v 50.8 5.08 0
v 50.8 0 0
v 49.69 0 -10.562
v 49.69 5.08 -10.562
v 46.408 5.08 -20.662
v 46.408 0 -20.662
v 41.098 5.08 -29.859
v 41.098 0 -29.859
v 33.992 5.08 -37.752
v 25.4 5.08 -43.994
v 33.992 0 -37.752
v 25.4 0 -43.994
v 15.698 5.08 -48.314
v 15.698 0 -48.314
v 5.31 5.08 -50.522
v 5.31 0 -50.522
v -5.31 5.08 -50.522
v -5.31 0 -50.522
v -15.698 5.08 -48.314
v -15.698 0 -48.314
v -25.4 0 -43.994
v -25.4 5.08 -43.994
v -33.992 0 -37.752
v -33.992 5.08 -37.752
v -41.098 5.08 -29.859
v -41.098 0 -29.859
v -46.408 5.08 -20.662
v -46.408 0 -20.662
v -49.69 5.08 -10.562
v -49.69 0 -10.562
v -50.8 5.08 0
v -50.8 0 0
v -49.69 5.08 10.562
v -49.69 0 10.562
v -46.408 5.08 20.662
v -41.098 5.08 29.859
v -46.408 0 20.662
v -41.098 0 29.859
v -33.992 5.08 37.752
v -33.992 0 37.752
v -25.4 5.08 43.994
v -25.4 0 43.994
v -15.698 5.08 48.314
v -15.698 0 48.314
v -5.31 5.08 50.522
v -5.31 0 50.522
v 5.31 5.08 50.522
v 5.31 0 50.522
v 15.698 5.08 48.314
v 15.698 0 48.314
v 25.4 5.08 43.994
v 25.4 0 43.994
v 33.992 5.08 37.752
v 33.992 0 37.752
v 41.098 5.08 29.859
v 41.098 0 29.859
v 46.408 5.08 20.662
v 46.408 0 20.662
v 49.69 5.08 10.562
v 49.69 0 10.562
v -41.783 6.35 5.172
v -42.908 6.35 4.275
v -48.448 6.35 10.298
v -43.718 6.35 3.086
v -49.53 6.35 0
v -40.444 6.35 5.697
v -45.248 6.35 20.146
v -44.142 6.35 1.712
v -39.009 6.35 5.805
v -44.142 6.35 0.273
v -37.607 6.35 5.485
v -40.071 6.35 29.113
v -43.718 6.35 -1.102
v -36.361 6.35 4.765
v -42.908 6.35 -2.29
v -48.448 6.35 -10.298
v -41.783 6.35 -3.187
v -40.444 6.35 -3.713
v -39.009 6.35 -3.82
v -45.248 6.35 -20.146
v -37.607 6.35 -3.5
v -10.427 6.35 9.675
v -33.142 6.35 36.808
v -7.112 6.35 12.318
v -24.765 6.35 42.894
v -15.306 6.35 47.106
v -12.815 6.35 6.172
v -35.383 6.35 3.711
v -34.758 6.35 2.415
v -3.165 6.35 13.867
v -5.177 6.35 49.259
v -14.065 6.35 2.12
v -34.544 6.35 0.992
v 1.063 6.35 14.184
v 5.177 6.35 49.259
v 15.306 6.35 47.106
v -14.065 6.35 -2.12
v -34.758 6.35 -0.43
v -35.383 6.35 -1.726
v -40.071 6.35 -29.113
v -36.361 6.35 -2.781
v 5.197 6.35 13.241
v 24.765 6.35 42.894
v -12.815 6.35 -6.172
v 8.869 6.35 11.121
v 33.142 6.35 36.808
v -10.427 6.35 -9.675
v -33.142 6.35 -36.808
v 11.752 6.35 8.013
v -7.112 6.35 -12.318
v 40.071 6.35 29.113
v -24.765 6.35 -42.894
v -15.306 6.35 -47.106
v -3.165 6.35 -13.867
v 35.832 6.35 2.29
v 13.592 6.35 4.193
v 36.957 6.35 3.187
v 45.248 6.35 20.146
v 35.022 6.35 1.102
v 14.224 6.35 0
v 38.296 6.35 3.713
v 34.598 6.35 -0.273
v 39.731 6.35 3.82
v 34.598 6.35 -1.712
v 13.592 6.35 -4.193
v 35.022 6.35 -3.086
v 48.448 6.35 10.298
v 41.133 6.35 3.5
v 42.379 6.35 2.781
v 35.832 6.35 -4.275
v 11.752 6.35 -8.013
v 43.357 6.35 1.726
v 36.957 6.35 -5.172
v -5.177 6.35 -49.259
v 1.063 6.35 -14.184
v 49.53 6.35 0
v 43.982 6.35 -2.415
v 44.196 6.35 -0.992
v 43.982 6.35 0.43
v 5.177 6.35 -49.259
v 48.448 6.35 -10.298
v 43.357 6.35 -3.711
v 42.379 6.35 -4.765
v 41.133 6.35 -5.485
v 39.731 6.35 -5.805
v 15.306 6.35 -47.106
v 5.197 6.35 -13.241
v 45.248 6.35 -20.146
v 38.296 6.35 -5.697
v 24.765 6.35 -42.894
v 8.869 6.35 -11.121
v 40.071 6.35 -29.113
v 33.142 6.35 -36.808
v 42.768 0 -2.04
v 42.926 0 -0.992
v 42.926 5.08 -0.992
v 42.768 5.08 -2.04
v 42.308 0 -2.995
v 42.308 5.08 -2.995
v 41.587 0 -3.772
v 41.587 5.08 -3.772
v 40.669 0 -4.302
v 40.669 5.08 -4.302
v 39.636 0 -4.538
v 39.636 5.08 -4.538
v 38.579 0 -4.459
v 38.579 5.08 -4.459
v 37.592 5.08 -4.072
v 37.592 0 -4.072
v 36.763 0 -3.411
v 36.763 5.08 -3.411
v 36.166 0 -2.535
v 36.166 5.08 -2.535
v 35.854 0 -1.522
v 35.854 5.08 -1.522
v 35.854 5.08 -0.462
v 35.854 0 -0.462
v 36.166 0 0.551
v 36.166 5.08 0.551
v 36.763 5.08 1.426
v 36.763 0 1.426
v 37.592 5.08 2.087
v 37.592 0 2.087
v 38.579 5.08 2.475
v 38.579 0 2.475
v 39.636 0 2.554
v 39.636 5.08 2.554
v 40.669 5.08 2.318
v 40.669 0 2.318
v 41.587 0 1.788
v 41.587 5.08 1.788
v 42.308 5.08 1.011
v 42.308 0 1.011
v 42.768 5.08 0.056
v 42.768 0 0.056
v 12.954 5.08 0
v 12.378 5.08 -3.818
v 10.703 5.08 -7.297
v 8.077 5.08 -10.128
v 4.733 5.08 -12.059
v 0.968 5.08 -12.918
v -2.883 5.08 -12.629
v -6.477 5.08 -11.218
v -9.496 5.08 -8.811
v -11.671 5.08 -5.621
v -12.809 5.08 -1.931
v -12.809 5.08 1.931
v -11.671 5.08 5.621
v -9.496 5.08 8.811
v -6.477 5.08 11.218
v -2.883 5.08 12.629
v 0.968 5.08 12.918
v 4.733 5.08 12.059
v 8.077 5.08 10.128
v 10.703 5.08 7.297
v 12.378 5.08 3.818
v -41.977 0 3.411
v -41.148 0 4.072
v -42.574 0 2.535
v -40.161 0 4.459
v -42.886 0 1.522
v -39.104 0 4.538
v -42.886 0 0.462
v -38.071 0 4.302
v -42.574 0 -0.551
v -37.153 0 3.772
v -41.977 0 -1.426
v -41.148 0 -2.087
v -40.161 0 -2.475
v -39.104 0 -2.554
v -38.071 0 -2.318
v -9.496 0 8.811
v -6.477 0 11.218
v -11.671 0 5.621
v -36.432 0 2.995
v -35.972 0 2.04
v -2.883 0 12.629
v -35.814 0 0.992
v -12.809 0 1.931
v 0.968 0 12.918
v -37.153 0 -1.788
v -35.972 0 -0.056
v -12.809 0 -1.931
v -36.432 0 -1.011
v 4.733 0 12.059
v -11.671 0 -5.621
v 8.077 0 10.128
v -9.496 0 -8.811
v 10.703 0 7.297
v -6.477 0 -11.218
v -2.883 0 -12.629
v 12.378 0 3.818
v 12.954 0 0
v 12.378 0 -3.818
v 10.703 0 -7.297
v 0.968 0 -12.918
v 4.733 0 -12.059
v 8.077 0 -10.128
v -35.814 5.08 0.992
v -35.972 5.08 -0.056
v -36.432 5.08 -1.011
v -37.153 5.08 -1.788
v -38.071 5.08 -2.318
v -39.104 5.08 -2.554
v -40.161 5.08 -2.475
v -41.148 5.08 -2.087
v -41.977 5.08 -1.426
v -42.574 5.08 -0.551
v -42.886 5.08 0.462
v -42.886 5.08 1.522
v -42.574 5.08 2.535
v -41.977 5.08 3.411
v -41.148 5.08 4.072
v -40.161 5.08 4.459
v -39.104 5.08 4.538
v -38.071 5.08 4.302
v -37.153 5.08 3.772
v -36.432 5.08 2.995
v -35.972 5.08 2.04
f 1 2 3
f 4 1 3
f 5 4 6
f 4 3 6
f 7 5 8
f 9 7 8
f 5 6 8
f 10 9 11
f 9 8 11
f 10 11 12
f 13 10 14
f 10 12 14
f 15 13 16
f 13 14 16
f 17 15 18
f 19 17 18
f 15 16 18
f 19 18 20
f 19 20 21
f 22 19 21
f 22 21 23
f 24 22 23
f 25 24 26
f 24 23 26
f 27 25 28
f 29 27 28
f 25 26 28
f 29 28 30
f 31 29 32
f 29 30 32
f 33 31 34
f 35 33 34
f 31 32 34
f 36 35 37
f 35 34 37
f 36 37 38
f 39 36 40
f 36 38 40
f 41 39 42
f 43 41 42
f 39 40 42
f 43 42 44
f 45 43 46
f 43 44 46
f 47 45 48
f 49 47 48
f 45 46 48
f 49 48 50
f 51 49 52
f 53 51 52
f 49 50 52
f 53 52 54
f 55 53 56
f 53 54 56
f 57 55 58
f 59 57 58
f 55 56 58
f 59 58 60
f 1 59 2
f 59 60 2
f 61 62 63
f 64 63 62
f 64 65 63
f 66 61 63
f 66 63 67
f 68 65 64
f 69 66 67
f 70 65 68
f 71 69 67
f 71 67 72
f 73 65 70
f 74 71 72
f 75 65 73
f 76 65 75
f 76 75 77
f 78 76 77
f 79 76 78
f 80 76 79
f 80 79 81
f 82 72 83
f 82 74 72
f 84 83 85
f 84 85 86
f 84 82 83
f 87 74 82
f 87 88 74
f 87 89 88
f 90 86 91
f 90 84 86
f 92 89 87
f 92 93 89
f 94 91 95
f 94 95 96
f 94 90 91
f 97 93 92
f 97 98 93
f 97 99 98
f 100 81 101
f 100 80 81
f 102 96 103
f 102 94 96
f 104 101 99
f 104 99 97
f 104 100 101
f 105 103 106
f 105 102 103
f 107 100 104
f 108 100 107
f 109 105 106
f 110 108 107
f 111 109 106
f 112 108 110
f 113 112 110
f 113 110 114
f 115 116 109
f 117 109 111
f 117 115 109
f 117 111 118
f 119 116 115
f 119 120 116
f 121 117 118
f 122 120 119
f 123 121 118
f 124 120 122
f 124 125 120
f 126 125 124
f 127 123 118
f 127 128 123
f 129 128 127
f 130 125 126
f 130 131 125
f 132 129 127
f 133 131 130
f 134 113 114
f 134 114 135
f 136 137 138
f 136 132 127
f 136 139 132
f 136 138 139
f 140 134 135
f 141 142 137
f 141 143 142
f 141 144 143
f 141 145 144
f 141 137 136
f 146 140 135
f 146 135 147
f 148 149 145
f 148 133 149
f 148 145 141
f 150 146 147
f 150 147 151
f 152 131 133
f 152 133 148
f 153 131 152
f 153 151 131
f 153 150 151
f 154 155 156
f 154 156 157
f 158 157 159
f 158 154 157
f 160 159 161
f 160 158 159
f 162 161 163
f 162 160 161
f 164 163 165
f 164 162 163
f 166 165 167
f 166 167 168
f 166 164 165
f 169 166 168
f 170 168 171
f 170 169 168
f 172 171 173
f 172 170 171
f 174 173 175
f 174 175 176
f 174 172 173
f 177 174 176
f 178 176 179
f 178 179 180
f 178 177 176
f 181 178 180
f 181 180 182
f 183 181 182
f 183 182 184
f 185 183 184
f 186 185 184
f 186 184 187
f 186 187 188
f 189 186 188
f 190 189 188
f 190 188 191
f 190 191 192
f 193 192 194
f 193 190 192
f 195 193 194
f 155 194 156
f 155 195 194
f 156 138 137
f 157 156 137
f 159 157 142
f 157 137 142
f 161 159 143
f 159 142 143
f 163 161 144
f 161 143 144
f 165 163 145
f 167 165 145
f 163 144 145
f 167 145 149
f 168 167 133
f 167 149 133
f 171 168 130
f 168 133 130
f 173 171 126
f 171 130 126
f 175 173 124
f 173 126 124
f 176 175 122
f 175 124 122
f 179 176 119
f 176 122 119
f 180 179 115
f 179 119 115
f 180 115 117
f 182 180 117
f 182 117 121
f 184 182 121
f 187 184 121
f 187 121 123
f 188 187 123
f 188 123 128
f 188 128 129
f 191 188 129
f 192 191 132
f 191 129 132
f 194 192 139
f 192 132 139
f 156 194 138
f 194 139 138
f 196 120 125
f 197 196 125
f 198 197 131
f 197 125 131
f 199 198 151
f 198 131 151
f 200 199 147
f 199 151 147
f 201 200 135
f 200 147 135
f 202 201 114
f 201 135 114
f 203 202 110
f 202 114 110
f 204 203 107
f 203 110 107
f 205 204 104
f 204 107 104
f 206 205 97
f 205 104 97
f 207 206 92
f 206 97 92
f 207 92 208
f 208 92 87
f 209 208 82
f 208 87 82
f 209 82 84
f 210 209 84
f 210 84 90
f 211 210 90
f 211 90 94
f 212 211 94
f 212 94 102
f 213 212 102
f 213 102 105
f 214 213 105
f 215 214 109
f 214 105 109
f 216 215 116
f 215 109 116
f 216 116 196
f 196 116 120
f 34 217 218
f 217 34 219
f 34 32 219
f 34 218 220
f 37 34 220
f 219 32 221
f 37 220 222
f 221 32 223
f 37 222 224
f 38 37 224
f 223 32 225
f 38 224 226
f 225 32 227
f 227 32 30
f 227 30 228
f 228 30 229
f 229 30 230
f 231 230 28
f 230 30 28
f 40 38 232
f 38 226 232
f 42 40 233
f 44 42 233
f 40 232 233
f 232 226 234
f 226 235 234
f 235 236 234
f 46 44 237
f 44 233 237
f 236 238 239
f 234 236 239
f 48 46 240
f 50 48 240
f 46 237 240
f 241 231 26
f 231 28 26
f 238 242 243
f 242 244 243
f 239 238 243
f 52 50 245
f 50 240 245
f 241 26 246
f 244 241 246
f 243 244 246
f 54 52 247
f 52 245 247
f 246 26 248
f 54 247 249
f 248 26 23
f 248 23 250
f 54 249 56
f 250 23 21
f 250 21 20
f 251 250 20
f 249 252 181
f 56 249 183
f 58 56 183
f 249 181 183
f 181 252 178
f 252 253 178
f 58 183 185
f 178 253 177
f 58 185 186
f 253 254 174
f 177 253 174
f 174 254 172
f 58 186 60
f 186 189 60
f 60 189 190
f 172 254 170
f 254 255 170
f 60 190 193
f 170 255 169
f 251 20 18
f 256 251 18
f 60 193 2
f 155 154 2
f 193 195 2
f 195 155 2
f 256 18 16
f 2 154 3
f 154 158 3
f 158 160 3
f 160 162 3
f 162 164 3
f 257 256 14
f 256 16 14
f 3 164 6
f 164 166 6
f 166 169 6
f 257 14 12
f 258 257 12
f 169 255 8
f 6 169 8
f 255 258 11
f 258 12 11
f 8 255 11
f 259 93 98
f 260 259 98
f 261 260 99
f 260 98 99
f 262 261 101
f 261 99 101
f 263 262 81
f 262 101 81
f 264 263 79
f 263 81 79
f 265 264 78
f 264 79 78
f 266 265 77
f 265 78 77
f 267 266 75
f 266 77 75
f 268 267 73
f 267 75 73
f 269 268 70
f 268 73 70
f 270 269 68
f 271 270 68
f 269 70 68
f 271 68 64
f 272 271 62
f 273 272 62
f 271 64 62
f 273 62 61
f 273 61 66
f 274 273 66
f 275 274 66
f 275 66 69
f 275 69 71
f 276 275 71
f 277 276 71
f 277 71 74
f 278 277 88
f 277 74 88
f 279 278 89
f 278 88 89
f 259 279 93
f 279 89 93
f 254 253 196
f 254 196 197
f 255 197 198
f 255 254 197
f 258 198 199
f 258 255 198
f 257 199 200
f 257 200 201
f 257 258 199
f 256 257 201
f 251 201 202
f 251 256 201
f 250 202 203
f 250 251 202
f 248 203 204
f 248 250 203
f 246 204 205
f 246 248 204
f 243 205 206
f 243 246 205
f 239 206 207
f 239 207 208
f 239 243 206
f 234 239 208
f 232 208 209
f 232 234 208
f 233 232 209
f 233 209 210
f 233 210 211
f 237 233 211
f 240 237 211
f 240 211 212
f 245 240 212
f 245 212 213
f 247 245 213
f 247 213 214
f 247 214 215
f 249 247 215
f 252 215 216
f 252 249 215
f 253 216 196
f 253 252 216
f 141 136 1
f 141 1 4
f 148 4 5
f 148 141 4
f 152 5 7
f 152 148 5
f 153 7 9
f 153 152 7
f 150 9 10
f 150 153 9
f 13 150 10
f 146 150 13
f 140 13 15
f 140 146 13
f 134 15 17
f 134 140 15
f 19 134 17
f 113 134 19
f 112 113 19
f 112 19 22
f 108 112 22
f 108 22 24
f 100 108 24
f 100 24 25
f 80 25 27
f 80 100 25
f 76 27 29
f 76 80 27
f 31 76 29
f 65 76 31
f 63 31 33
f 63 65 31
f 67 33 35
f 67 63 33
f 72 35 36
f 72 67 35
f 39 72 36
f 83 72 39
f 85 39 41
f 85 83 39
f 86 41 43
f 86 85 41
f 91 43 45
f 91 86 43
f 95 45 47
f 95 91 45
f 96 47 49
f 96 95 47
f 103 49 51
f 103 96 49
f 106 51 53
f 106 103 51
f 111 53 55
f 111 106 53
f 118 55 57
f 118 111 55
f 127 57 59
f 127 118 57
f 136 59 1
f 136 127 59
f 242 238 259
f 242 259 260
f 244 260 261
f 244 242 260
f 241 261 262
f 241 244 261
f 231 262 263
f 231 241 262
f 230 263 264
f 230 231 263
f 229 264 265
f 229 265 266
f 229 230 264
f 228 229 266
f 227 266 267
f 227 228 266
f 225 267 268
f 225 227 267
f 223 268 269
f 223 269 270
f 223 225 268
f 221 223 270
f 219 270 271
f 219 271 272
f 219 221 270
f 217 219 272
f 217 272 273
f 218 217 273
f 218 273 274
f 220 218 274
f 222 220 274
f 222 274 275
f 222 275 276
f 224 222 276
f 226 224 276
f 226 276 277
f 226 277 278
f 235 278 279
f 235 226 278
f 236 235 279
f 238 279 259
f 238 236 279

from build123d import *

# Parameters (mm, degrees)
SKETCH1_R           = 50.8
SKETCH1_R_2         = 3.556
SKETCH1_R_3         = 12.954
BOSS_EXTRUDE1_DEPTH = 6.35
CHAMFER1_SIZE       = 1.27


with BuildPart() as part:
    # Sketch1 → Boss-Extrude1 (new body)
    with BuildSketch(Plane(origin=(0, 0, 0), x_dir=(1, 0, 0), z_dir=(0, 1, 0))):
        Circle(SKETCH1_R)
        with Locations((-39.37, -0.992258715)):
            Circle(SKETCH1_R_2, mode=Mode.SUBTRACT)
        Circle(SKETCH1_R_3, mode=Mode.SUBTRACT)
        with Locations((39.37, 0.992258715)):
            Circle(SKETCH1_R_2, mode=Mode.SUBTRACT)
    extrude(amount=BOSS_EXTRUDE1_DEPTH)

    # Chamfer1
    chamfer1_edges = [part.edges().sort_by_distance(p)[0] for p in [
        (35.814, 6.35, -0.992258715),
        (-50.8, 6.35, 0),
        (-42.926, 6.35, 0.992258715),
        (-12.954, 6.35, 0),
    ]]
    chamfer(chamfer1_edges, length=CHAMFER1_SIZE)


solid = part.part
